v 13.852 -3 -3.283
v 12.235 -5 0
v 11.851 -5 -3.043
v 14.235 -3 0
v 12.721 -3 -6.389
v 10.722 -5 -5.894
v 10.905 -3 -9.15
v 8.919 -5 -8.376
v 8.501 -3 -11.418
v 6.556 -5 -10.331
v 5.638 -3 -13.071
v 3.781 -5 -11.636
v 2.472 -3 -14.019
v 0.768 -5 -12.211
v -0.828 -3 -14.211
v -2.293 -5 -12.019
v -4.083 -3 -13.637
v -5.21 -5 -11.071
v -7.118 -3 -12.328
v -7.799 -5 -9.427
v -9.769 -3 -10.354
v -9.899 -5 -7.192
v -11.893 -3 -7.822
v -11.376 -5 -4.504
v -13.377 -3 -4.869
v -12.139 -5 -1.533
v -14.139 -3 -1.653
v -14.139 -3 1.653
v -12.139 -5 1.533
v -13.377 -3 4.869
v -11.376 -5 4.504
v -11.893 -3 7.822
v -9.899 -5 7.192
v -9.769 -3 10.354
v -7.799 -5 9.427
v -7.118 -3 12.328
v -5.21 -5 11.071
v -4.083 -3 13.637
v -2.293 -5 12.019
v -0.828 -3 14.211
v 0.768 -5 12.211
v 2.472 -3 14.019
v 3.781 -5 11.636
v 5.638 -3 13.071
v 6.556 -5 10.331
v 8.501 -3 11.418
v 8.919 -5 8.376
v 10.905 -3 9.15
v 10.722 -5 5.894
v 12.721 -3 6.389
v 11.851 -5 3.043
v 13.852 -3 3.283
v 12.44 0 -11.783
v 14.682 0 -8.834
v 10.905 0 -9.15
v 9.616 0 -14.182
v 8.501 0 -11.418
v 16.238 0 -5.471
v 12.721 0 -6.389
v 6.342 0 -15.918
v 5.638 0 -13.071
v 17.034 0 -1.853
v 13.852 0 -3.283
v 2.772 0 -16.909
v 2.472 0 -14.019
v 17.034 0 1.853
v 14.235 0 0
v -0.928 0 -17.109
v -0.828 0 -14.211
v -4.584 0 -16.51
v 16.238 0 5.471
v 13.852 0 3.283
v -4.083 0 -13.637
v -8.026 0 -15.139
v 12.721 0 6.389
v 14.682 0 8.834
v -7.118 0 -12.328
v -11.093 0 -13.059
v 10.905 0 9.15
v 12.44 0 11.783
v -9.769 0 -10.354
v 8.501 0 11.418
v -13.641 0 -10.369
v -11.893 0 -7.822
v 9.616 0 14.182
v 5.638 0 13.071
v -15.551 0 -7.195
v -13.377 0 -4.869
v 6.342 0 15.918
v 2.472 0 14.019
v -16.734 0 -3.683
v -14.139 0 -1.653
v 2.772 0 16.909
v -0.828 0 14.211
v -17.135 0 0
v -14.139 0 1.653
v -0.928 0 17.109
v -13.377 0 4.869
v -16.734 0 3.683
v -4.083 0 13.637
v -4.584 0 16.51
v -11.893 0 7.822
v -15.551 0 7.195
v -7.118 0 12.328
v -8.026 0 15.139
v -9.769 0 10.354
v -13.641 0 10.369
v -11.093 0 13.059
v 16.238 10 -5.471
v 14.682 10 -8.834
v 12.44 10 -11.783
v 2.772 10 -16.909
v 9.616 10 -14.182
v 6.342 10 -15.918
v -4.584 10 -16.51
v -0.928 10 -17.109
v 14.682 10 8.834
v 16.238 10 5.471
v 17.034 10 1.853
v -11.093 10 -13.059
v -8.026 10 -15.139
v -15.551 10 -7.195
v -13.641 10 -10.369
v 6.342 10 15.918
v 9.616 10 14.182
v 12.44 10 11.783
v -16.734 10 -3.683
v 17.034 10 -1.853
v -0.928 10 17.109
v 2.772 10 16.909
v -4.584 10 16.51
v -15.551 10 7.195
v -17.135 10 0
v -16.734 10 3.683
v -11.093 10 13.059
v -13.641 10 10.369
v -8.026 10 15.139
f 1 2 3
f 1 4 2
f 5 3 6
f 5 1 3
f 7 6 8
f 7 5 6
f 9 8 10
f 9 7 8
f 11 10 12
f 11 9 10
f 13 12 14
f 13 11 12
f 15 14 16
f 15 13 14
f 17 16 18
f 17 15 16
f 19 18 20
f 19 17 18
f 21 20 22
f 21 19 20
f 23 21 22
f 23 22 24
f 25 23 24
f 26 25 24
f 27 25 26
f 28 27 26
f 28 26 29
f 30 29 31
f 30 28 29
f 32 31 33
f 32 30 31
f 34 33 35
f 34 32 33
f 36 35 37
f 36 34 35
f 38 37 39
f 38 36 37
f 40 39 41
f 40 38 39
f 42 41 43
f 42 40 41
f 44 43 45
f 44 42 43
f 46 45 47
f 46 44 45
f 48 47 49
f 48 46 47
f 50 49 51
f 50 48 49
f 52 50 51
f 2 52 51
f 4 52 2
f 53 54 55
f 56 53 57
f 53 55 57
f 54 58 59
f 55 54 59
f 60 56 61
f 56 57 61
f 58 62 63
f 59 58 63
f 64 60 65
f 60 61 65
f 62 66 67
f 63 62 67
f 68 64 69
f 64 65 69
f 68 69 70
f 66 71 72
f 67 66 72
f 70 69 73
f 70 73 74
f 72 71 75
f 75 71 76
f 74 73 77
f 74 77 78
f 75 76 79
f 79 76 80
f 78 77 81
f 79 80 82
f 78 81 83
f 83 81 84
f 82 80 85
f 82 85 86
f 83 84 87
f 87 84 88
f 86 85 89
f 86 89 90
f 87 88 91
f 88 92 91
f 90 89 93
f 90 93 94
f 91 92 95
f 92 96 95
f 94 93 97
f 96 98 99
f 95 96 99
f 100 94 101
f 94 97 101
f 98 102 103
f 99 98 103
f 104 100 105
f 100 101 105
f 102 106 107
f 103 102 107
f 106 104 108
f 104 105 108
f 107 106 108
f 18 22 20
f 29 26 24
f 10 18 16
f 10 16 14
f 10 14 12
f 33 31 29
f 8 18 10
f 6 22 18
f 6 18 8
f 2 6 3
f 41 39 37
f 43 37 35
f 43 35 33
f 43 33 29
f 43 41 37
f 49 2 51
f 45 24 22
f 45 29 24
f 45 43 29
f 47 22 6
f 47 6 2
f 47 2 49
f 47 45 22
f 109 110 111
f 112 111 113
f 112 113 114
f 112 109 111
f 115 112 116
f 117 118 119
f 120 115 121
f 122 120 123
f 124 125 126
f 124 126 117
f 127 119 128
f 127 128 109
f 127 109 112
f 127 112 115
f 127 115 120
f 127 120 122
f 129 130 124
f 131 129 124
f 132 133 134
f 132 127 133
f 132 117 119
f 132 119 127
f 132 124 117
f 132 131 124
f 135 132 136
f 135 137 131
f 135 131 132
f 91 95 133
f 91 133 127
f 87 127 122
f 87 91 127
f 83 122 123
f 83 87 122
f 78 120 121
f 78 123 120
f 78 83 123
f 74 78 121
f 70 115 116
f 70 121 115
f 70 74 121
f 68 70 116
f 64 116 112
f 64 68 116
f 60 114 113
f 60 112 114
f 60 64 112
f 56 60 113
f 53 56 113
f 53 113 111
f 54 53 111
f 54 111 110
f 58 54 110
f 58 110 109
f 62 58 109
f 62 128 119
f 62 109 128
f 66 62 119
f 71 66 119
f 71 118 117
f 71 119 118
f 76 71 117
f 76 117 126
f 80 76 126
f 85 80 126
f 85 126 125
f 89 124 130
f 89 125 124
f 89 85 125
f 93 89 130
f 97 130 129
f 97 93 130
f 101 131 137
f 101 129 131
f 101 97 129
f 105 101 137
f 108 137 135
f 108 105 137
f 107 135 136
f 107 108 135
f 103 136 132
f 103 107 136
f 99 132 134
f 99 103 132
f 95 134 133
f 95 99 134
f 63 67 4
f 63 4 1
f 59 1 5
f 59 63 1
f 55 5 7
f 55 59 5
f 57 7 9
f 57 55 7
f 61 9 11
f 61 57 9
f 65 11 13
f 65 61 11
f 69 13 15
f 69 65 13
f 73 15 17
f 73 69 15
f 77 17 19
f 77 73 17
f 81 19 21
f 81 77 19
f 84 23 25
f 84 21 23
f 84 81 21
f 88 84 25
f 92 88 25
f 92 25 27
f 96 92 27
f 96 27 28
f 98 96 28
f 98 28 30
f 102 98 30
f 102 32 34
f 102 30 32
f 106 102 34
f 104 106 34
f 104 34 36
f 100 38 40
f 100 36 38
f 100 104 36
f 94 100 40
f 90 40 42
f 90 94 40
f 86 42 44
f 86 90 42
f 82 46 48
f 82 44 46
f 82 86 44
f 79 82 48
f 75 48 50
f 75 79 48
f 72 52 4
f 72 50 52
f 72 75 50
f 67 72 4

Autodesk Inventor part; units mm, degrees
ref_plane "YZ Plane" through (0, 0, 0) normal (1, 0, 0) x (0, 1, 0)
ref_plane "XZ Plane" through (0, 0, 0) normal (0, 1, 0) x (-1, 0, 0)
ref_plane "XY Plane" through (0, 0, 0) normal (0, 0, 1) x (1, 0, 0)
sketch "Sketch1" plane through (0, 0, 0) normal (0, 1, 0) x (-1, 0, 0)
  circle A0 centre (0, 0) radius 17.1346
extrude "Extrusion1" add sketch "Sketch1" along normal blind 10
sketch "Sketch2" plane through (0, 0, 0) normal (0, -1, 0) x (1, 0, 0)
  circle A0 centre (0, 0) radius 14.2353
extrude "Extrusion2" add sketch "Sketch2" along normal blind 5
chamfer "Chamfer1" distance 2 angle 45 1 edges at (-14.2353, -5, 0)
properties part number "Tapon externo"
